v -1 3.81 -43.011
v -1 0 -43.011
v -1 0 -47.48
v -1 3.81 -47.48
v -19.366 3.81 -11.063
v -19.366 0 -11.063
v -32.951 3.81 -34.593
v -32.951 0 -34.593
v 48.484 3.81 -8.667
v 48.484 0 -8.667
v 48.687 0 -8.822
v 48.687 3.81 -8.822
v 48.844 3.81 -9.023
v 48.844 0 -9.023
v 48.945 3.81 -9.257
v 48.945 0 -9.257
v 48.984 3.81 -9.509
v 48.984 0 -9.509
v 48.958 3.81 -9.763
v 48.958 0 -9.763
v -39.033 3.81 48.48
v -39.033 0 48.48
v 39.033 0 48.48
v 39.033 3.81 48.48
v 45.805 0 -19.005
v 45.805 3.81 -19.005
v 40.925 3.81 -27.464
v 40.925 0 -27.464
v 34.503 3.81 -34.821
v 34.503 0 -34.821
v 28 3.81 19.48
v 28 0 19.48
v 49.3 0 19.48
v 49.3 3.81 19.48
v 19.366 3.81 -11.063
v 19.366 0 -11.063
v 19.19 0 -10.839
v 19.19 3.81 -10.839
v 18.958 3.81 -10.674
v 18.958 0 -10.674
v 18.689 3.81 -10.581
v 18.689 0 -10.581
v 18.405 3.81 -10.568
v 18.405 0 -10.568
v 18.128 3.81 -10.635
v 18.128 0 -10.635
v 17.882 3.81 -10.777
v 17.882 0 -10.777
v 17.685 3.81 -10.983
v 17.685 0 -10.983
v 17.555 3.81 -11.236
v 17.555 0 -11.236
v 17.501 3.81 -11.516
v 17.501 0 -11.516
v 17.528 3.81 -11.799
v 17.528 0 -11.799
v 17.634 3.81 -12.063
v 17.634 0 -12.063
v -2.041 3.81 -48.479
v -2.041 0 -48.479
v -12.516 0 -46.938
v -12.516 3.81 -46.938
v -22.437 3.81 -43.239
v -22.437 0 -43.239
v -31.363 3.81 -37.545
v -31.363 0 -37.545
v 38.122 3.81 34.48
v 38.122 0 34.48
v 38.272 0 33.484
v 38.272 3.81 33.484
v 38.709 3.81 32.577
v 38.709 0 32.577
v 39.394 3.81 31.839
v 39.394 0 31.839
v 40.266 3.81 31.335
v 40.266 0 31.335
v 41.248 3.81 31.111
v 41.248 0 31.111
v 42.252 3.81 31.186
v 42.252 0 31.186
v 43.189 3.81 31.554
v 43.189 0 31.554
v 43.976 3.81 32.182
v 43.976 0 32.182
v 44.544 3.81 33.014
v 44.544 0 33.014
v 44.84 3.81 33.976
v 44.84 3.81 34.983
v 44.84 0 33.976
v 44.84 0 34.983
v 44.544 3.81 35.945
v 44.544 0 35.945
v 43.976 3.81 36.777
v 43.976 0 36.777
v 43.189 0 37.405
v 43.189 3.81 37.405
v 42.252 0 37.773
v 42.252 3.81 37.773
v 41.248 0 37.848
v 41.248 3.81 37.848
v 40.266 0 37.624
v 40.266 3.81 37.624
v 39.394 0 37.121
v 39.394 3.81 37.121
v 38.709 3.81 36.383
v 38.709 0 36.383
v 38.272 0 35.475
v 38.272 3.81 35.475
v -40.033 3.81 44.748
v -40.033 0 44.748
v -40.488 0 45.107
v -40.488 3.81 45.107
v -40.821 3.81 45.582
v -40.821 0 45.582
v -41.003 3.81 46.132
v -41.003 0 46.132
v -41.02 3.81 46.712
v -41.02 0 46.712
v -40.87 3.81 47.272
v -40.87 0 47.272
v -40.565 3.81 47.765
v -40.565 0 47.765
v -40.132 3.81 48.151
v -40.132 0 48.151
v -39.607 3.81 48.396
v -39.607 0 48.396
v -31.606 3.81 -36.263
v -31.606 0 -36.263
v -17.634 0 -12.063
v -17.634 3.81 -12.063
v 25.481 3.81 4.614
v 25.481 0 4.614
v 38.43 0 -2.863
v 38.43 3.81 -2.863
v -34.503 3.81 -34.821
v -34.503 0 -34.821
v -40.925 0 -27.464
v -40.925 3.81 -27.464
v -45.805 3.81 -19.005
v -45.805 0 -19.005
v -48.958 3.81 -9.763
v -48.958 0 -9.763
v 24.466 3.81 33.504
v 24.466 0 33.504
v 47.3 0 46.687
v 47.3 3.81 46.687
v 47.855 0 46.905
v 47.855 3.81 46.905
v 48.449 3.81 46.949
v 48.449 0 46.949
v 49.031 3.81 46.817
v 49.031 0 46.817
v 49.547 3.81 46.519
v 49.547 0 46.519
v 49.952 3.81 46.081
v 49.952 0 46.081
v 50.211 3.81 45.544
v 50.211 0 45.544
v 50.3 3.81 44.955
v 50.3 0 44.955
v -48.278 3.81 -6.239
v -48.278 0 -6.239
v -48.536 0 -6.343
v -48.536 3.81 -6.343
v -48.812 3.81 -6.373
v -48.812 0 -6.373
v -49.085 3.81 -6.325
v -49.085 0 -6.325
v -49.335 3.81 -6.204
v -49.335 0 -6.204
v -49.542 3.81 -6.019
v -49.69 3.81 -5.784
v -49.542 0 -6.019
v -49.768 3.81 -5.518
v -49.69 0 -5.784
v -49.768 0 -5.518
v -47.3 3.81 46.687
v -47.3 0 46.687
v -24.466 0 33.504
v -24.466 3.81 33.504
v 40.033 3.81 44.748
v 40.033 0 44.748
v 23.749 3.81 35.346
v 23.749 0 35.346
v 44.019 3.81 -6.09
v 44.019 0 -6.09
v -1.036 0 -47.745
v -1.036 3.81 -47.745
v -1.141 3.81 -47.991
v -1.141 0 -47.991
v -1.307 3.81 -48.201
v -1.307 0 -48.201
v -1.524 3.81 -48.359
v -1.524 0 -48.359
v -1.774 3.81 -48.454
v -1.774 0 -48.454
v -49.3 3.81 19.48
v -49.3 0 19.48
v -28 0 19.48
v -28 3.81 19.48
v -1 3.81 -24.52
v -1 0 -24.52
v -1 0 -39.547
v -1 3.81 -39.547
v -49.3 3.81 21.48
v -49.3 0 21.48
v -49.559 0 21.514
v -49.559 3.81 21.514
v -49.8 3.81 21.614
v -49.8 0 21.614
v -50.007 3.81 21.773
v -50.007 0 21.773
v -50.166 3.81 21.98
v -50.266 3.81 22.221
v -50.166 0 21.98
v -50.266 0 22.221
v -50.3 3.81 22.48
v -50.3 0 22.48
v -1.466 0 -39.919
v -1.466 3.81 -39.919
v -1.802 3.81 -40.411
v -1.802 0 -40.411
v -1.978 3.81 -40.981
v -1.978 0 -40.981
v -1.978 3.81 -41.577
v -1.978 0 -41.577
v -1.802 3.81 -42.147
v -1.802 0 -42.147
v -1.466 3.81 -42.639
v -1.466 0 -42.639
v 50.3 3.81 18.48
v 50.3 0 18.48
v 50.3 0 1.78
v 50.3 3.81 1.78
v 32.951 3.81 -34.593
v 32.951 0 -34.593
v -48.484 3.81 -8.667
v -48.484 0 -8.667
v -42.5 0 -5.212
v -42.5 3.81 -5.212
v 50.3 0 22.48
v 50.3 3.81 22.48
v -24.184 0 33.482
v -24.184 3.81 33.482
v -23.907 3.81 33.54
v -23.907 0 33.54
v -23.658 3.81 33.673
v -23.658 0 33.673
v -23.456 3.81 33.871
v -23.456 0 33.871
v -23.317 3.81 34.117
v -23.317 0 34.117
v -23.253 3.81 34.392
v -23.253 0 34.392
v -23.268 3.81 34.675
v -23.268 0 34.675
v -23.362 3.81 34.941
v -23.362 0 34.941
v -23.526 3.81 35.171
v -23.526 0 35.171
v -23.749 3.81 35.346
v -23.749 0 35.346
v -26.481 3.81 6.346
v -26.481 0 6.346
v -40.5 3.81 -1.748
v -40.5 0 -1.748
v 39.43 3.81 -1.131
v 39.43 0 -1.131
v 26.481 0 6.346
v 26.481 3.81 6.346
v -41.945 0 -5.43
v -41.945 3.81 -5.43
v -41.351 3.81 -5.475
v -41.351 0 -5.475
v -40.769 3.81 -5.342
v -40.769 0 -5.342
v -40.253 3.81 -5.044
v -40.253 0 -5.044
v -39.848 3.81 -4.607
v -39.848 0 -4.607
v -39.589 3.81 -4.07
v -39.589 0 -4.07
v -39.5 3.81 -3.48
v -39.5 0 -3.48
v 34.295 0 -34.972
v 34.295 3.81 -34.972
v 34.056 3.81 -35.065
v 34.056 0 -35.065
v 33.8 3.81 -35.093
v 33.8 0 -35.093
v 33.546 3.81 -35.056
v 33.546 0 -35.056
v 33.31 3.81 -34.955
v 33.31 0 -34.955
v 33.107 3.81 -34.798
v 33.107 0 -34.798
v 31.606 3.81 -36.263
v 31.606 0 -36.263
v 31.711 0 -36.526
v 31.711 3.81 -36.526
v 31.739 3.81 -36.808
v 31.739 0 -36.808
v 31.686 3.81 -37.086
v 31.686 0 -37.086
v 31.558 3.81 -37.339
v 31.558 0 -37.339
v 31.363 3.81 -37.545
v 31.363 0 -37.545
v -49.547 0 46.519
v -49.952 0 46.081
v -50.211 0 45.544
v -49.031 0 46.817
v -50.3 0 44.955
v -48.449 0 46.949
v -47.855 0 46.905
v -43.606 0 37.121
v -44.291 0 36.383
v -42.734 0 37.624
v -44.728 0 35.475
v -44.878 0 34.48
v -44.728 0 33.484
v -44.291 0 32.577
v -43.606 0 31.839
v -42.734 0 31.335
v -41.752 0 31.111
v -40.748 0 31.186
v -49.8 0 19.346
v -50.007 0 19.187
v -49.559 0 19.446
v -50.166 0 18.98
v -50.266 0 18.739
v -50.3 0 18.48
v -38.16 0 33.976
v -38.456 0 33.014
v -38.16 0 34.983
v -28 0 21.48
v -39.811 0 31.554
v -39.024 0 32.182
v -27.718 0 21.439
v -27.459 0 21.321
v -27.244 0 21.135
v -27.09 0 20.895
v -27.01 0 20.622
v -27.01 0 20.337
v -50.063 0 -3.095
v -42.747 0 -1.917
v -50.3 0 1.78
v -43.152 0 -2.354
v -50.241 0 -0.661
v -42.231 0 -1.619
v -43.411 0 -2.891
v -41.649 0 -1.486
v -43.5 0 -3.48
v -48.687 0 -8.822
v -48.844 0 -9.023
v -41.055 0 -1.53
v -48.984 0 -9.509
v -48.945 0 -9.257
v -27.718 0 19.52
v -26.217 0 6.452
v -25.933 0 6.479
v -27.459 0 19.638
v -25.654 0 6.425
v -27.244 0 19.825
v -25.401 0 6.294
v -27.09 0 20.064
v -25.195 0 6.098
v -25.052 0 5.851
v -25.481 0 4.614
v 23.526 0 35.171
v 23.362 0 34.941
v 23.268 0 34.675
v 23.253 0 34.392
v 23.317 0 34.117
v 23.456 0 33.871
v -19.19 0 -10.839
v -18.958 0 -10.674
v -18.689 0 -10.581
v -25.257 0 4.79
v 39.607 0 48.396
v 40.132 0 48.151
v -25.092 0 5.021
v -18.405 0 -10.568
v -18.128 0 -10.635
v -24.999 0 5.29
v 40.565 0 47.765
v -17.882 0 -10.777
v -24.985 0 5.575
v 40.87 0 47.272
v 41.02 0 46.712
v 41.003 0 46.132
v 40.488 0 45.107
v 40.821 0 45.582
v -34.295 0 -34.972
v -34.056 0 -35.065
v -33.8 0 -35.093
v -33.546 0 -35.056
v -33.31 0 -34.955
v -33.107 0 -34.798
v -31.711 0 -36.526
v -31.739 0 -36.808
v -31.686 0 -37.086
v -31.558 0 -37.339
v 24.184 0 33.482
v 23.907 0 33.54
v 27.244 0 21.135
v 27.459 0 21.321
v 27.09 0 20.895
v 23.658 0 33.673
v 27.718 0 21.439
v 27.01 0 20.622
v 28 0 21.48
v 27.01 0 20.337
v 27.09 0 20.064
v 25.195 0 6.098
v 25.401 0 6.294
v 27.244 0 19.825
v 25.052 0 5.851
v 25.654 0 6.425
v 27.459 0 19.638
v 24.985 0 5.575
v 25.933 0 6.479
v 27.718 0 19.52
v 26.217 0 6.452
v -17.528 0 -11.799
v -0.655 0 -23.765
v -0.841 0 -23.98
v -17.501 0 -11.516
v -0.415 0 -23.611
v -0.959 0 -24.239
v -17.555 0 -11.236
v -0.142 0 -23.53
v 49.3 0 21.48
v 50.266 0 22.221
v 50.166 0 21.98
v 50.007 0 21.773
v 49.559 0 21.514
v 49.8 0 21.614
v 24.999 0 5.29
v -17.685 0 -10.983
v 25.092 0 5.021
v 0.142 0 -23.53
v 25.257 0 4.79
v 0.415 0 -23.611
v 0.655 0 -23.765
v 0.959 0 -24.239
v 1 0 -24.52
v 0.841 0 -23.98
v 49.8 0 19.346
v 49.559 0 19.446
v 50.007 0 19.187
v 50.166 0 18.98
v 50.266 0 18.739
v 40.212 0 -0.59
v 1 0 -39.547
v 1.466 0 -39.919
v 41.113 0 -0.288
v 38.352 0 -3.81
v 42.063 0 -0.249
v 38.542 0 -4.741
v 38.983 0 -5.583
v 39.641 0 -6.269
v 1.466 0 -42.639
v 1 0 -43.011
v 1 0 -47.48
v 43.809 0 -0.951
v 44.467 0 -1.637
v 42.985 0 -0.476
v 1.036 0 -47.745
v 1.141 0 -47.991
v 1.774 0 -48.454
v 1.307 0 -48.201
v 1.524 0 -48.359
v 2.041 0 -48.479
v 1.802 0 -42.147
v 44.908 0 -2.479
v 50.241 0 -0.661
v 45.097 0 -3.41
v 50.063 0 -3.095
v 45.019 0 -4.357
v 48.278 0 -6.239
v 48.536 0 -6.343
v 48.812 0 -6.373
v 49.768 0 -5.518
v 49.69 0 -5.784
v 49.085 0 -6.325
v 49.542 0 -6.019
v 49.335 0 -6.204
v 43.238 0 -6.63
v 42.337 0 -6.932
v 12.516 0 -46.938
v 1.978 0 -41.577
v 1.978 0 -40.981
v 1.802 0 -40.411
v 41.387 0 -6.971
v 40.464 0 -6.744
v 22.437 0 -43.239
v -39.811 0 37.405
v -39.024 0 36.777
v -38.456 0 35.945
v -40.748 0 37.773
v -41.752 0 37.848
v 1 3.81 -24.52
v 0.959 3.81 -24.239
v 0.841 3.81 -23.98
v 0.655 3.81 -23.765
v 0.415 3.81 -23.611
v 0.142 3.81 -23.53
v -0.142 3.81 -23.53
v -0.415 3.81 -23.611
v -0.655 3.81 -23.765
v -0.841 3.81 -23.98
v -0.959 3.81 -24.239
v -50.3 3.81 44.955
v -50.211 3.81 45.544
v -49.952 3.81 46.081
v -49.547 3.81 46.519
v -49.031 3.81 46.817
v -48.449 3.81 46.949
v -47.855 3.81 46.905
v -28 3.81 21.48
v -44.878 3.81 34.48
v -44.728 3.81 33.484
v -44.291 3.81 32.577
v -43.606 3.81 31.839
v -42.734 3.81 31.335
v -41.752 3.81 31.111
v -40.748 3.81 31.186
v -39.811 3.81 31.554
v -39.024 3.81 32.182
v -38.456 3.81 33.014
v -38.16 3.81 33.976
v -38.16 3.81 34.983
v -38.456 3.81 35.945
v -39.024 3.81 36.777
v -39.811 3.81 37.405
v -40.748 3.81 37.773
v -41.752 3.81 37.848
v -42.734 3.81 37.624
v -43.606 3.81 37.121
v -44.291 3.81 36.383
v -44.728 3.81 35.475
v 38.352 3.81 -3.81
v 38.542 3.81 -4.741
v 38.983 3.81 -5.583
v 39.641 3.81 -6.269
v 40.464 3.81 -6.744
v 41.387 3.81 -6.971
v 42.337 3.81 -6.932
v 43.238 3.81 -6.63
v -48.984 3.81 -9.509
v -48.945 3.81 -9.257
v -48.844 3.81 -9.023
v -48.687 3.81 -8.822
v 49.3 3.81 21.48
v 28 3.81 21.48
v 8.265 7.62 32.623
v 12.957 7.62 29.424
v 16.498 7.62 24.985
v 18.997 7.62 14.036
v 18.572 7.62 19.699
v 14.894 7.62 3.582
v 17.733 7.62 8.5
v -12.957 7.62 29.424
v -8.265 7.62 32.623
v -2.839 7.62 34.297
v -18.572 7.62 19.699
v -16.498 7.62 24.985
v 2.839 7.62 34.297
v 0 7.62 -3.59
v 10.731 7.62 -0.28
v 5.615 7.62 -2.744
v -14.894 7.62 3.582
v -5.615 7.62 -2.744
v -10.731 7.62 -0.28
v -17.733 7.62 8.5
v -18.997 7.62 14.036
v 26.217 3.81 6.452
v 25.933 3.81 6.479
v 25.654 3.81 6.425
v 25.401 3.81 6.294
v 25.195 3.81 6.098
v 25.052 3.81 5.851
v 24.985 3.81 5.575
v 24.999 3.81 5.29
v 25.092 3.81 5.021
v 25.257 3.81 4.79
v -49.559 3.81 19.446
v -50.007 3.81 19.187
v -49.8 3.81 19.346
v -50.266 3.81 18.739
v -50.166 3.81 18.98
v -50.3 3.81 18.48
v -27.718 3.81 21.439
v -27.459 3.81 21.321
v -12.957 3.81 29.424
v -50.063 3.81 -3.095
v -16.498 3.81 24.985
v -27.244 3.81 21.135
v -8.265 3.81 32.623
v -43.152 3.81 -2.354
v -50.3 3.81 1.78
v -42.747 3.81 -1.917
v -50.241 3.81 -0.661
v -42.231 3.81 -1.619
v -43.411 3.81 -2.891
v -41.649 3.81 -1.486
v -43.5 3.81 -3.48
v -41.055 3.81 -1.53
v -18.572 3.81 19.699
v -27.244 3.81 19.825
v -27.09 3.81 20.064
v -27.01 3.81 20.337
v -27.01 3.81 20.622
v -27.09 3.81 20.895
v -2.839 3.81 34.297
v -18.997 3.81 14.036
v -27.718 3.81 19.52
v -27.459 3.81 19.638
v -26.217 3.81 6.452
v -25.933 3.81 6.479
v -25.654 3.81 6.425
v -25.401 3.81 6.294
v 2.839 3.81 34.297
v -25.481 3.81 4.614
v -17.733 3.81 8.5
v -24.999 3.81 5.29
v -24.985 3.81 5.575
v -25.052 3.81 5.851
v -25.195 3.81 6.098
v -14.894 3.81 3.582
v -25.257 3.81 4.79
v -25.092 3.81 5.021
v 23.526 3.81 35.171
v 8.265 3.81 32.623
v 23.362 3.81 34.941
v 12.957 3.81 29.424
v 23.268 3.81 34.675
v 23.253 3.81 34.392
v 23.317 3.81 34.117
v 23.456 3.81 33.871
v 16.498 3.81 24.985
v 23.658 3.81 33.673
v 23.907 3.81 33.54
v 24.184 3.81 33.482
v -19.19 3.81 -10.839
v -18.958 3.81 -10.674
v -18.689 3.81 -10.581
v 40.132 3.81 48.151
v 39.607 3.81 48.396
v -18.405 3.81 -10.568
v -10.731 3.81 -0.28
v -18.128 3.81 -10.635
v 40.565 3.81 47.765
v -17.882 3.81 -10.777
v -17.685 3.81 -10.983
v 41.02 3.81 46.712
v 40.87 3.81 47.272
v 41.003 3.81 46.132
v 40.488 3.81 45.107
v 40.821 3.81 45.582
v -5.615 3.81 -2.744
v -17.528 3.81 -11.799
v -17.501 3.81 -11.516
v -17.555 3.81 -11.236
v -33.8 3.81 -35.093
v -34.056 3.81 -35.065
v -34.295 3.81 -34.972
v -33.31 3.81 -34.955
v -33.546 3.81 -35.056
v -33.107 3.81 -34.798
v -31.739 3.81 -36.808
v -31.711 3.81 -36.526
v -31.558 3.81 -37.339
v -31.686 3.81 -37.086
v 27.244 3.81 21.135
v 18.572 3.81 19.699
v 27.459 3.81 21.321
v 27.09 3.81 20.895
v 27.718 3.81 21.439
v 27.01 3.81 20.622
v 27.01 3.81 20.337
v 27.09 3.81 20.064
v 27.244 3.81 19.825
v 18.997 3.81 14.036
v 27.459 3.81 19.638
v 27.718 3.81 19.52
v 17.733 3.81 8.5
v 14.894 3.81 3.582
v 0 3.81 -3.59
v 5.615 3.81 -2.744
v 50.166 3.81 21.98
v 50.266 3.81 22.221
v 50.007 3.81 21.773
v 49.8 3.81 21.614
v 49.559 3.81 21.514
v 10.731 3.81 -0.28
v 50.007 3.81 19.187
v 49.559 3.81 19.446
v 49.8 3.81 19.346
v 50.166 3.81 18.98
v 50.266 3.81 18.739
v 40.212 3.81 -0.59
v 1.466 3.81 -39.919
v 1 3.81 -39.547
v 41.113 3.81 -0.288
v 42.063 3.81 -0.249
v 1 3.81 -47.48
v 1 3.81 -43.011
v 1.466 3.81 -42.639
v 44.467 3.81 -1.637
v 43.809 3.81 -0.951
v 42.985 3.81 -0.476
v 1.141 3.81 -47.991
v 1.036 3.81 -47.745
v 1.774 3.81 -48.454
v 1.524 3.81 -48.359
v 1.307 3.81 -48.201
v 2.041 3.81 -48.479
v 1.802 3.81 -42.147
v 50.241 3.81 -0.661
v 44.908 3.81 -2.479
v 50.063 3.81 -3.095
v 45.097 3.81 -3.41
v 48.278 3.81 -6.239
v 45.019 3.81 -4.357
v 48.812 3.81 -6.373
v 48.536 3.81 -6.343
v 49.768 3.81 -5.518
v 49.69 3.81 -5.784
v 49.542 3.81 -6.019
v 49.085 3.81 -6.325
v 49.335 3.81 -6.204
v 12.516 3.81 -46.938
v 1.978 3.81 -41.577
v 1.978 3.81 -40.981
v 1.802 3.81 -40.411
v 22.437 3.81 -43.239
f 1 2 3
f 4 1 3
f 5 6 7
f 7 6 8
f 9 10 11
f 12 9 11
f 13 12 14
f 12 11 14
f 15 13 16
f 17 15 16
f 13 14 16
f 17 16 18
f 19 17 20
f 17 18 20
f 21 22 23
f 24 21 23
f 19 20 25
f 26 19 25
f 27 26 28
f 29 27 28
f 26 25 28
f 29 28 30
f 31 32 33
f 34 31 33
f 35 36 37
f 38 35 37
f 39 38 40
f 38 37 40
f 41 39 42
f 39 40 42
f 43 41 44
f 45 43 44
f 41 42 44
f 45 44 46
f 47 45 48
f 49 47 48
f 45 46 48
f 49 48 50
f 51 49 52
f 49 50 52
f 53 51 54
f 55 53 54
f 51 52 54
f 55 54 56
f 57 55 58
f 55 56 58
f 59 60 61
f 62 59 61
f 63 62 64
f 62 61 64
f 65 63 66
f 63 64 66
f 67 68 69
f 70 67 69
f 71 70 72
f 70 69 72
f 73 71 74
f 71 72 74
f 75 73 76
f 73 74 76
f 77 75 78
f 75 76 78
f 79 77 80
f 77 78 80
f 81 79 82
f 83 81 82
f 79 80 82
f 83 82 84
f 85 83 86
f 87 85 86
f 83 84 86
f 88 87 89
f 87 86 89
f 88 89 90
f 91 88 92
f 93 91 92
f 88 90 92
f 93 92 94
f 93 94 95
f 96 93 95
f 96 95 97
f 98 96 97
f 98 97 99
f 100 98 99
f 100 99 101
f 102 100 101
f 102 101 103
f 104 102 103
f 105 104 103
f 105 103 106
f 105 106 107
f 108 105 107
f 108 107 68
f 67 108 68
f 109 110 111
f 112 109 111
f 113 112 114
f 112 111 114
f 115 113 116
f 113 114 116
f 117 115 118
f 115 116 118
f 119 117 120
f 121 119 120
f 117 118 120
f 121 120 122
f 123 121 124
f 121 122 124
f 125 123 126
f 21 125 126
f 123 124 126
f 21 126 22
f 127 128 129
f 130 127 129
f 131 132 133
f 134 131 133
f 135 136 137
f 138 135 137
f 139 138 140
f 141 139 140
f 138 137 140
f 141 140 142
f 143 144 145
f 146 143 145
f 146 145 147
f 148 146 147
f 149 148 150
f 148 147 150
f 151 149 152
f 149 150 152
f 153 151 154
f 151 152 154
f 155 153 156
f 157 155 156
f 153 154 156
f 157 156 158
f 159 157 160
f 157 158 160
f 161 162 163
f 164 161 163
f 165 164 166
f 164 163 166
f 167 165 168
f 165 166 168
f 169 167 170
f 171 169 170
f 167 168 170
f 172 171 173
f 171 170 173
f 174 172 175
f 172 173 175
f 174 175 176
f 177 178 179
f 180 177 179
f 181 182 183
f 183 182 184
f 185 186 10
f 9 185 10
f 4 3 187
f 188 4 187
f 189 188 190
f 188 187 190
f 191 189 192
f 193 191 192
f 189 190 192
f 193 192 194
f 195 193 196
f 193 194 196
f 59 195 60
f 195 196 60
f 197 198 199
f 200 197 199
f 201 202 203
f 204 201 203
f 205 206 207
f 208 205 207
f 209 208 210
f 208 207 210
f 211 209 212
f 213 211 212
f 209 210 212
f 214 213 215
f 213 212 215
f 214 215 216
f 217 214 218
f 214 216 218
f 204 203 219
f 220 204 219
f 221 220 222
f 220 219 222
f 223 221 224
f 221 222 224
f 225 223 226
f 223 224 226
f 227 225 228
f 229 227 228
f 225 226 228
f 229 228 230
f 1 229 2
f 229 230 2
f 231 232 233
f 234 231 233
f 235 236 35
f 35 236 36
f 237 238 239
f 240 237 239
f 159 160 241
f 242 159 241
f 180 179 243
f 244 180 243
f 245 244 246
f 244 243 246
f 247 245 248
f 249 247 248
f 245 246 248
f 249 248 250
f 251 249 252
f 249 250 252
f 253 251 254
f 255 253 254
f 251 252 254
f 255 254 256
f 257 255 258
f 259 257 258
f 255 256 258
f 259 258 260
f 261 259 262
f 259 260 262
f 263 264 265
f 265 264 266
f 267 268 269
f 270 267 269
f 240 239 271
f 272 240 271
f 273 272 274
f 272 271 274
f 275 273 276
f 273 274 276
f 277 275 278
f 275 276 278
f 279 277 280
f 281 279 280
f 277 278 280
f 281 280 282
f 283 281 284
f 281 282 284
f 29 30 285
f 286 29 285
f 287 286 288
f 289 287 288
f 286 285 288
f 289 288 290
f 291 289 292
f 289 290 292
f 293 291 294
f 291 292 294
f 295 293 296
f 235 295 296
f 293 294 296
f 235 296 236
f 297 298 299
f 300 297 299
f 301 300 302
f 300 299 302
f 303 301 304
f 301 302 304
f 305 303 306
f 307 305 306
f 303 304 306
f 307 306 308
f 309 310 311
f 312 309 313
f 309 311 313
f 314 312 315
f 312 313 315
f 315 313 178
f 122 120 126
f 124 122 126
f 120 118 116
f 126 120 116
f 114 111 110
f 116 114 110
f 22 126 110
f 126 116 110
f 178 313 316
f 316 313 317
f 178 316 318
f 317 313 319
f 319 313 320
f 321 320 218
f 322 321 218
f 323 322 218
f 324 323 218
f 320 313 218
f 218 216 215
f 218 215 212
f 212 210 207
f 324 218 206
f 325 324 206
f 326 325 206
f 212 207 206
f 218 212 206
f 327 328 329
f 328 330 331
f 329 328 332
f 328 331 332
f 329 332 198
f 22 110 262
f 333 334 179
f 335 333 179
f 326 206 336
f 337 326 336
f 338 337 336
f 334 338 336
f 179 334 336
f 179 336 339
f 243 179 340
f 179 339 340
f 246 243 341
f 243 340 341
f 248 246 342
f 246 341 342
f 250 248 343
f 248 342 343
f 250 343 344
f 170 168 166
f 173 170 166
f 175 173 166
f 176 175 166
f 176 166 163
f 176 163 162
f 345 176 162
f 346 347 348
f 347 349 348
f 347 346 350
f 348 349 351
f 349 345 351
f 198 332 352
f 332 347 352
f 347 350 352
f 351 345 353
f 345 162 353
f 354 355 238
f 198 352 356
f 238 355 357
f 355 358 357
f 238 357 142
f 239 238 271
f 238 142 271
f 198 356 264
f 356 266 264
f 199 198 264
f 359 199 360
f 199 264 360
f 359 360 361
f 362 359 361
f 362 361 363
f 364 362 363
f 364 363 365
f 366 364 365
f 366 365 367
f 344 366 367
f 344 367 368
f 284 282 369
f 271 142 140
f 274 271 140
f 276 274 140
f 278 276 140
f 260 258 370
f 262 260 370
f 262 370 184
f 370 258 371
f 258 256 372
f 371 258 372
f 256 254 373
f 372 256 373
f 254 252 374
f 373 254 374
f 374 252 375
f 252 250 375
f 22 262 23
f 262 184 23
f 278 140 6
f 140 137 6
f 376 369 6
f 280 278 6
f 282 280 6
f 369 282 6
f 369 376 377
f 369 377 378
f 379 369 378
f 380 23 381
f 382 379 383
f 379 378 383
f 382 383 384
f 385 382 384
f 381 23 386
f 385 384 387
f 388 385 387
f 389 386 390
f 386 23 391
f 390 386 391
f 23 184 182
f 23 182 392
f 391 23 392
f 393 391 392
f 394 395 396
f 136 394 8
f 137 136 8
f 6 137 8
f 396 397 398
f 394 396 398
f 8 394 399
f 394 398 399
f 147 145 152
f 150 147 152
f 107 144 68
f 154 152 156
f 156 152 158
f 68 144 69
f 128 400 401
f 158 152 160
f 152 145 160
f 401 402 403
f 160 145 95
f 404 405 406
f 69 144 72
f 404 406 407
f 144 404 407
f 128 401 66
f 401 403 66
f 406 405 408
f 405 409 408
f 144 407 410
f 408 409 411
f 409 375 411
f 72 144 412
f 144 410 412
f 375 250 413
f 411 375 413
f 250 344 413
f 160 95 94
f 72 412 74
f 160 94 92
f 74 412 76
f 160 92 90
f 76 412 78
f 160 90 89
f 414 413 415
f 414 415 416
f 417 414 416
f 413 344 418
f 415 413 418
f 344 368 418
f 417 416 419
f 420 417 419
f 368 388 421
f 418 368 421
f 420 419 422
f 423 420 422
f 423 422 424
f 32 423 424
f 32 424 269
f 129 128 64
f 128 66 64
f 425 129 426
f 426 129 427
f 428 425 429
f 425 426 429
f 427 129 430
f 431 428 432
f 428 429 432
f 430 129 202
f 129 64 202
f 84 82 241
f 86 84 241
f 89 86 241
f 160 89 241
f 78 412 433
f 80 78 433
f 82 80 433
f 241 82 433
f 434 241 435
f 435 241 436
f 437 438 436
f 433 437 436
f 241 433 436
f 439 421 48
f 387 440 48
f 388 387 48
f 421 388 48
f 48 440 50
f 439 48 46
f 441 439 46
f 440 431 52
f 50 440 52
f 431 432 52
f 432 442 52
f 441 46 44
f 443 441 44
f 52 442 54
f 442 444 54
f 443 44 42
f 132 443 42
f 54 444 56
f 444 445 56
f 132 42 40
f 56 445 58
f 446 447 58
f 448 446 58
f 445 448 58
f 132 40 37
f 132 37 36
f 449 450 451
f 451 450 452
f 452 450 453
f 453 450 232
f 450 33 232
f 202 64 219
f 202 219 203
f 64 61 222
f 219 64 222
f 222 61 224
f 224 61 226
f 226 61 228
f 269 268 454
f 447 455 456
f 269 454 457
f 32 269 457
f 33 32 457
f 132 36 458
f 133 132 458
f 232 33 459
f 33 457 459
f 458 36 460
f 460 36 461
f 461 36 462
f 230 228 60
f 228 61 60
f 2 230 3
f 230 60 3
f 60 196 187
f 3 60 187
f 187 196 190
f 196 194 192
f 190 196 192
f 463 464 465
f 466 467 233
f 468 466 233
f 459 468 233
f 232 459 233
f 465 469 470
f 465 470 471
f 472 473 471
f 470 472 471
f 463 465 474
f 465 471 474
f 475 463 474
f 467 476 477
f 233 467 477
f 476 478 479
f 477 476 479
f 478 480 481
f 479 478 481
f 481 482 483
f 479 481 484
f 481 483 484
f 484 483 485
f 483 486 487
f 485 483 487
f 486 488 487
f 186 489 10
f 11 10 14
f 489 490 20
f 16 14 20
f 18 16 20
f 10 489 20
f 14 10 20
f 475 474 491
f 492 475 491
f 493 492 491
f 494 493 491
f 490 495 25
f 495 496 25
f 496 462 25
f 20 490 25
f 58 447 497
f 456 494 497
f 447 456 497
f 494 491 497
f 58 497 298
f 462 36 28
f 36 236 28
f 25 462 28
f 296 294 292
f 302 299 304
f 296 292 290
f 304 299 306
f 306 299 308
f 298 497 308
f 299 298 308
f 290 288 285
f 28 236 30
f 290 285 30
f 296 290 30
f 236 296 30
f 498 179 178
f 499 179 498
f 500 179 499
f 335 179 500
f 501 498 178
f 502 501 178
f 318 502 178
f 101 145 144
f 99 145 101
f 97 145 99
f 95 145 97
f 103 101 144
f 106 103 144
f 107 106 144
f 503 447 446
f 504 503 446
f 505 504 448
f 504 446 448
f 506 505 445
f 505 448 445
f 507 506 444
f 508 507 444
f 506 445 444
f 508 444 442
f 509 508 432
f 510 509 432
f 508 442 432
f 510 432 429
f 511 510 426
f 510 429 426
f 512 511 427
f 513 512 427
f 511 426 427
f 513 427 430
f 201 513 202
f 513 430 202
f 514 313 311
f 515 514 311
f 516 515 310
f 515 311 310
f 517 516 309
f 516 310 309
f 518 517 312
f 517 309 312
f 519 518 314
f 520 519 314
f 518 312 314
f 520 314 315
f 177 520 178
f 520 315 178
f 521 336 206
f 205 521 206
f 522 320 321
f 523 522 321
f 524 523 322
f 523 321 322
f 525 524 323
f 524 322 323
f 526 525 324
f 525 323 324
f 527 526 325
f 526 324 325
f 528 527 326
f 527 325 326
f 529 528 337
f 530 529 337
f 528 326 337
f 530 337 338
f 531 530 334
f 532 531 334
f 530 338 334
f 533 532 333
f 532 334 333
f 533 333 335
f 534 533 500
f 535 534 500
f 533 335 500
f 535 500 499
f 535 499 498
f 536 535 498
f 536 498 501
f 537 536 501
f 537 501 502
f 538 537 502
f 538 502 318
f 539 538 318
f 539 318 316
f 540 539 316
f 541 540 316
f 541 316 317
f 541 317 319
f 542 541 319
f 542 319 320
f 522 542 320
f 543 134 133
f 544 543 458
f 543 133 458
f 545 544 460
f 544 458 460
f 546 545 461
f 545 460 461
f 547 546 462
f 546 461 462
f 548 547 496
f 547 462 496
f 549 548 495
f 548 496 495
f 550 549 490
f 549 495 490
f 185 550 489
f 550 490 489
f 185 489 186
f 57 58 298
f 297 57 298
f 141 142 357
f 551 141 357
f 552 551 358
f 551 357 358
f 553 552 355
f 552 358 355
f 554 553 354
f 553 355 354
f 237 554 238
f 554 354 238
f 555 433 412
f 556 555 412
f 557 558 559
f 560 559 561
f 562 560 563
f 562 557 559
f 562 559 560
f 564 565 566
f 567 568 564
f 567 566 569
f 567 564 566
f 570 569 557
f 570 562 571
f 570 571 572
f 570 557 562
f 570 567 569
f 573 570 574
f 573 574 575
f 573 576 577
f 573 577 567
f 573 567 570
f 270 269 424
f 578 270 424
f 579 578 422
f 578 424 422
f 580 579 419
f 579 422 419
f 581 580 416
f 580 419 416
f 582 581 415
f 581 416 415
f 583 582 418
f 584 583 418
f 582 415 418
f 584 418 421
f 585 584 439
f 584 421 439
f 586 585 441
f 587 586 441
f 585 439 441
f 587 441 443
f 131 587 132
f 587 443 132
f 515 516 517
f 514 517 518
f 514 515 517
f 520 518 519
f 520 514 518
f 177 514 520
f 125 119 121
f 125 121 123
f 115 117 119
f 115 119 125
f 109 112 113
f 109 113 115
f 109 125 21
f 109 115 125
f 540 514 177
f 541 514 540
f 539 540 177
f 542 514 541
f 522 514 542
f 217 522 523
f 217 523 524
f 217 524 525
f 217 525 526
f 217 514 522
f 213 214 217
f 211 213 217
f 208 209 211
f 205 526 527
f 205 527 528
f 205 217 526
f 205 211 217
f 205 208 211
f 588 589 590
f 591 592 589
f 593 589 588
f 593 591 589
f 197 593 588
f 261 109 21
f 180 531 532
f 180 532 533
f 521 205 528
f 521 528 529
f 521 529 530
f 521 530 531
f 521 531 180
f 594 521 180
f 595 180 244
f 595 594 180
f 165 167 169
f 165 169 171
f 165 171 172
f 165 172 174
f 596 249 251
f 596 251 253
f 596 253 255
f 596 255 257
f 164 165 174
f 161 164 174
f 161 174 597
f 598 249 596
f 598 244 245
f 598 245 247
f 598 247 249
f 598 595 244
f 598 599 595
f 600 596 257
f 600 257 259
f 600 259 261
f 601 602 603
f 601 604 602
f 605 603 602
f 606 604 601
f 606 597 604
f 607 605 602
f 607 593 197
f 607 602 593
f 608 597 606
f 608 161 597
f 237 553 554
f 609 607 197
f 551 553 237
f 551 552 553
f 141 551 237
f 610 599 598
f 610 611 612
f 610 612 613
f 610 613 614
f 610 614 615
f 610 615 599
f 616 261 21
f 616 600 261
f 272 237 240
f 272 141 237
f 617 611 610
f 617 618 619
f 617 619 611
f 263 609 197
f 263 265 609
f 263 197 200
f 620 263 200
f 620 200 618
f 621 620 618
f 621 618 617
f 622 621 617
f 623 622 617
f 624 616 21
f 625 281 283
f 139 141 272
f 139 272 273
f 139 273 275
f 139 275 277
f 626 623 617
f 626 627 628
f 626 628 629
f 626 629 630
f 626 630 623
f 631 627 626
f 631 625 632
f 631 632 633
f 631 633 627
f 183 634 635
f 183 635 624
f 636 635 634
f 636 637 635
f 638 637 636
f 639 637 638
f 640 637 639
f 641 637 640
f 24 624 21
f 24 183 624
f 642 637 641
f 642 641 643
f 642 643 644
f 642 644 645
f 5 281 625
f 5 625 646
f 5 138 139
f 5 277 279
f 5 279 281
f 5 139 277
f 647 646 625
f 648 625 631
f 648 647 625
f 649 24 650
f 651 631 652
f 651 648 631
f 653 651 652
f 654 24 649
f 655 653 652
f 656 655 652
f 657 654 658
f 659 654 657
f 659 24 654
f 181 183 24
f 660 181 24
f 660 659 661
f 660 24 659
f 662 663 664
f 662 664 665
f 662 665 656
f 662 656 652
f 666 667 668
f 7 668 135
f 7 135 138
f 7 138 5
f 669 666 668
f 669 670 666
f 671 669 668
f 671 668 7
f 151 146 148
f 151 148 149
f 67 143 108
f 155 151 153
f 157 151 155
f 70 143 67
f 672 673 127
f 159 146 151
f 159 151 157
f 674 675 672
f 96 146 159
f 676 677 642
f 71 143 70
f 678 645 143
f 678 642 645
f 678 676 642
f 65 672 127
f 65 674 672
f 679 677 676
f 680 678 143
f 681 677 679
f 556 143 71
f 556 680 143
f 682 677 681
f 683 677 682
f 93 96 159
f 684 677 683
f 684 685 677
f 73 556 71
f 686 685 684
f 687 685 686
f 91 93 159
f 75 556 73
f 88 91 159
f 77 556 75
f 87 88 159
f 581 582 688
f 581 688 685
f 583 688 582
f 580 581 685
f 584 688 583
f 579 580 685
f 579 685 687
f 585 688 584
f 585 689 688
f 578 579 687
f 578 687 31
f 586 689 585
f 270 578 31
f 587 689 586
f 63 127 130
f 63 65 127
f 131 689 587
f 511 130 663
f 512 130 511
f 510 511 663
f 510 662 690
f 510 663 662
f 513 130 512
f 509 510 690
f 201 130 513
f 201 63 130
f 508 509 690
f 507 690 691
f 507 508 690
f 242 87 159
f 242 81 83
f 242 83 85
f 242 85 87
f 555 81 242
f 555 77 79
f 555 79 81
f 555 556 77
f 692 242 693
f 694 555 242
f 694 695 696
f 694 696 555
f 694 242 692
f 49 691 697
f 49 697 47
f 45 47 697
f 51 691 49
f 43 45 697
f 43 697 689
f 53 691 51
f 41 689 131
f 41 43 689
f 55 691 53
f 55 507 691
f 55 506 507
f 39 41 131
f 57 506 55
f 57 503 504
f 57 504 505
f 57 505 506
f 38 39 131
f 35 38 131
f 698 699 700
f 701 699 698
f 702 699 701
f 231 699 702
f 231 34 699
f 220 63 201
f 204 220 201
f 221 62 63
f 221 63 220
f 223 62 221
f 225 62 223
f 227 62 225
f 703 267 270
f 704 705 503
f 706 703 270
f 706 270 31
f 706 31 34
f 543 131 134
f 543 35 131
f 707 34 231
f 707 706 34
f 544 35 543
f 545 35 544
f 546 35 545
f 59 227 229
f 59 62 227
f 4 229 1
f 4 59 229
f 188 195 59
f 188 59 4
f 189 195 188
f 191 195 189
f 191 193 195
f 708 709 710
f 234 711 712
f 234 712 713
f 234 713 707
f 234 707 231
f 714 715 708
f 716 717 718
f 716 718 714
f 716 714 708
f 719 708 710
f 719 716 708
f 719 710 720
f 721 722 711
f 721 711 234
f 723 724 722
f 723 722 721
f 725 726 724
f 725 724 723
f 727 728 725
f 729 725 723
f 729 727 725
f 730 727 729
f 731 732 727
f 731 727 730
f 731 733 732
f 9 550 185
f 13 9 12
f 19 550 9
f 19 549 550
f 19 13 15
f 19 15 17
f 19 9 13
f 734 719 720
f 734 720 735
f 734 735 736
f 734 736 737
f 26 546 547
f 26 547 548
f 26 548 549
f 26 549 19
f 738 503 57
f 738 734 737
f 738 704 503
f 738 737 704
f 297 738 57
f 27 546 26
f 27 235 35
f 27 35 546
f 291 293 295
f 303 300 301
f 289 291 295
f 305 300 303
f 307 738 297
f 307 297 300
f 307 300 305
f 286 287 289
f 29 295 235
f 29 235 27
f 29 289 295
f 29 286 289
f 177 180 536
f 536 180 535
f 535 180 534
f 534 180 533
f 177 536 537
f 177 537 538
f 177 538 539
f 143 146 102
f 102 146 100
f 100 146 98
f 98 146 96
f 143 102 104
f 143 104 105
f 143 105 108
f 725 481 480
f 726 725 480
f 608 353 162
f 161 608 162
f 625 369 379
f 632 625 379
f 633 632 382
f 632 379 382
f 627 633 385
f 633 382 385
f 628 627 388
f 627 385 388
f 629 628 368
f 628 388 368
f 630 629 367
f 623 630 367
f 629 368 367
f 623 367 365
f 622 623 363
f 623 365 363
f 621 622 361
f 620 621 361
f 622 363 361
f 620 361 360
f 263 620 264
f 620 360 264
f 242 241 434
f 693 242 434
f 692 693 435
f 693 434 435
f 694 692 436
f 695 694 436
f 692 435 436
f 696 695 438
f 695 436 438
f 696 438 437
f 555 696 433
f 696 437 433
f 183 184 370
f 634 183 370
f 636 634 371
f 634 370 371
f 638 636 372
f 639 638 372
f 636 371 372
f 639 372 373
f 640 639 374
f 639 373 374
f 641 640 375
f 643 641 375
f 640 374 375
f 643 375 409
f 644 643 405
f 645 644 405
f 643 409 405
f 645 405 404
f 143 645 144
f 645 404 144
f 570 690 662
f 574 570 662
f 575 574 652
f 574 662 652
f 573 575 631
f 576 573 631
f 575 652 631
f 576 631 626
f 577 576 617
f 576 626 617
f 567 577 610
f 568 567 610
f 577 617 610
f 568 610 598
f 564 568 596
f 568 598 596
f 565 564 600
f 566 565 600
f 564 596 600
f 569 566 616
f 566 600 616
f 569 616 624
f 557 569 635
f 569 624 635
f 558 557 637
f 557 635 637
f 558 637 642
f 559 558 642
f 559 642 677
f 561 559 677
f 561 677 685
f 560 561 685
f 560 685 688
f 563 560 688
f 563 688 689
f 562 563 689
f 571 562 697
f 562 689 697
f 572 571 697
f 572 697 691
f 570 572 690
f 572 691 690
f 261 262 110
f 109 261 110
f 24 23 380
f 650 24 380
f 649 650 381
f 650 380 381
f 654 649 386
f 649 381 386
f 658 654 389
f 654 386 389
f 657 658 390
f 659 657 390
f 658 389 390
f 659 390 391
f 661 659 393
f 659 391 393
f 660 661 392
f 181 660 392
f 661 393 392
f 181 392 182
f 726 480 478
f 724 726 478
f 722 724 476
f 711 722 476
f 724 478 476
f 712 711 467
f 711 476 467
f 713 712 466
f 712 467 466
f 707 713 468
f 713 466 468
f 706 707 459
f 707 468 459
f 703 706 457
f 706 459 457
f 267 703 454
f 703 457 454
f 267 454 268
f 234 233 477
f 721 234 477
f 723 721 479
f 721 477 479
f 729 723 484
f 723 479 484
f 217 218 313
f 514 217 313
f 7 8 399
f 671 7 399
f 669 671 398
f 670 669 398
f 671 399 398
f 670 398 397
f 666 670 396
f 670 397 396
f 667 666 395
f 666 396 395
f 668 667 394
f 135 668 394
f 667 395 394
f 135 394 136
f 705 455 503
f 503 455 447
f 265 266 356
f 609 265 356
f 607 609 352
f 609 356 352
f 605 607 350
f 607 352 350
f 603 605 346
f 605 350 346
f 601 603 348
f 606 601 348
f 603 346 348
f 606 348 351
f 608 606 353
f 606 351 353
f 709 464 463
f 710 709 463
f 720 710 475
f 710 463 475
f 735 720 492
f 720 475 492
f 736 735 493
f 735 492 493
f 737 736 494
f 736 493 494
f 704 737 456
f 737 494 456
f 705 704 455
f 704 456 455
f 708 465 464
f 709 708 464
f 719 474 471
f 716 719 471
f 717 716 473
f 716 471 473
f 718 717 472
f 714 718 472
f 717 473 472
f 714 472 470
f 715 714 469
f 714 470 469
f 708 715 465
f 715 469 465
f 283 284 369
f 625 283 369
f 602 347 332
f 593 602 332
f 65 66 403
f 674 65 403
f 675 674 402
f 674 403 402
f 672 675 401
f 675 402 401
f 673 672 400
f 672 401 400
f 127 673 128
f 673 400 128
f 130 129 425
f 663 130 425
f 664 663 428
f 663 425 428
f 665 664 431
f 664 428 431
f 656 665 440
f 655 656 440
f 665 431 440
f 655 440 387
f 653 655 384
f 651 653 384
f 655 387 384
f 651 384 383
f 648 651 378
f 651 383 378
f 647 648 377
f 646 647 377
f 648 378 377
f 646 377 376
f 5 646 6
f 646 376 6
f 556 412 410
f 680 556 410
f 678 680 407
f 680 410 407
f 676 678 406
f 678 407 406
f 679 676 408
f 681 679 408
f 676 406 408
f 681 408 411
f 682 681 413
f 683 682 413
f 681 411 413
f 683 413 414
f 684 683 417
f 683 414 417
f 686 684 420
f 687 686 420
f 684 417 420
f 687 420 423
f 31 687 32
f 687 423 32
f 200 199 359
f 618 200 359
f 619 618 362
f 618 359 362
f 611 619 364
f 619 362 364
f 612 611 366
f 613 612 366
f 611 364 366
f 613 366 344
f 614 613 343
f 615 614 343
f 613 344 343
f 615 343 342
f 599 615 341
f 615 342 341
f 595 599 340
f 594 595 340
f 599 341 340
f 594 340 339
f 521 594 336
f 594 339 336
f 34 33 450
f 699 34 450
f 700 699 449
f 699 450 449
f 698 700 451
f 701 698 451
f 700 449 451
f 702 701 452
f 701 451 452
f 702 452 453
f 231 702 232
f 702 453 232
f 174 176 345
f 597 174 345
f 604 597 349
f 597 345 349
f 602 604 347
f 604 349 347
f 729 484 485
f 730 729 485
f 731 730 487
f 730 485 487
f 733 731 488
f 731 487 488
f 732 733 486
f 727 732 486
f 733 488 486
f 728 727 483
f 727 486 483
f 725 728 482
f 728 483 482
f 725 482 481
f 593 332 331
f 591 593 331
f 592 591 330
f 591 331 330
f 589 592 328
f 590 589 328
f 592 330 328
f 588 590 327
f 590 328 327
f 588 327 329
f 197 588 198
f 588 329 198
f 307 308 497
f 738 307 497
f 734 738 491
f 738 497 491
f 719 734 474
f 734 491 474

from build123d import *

# Parameters (mm, degrees)
SKETCH2_R                   = 2
BOSS_EXTRUDE1_DEPTH         = 3.81
SKETCH3_R                   = 19.05
BOSS_EXTRUDE2_DEPTH         = 3.81
F_1_4_CLEARANCE_HOLE1_D     = 6.7564
F_1_4_CLEARANCE_HOLE1_DEPTH = 3.81


with BuildPart() as part:
    # Sketch2 → Boss-Extrude1 (new body)
    with BuildSketch(Plane(origin=(0, 0, 0), x_dir=(1, 0, 0), z_dir=(0, 1, 0))):
        with BuildLine():
            Line((40.724728738, 1.878024889), (26.480762114, -6.345733076))
            ThreePointArc((26.480762114, -6.345733076), (25.11473671, -5.979707672), (25.480762114, -4.613682268))
            Line((25.480762114, -4.613682268), (39.724728738, 3.610075697))
            ThreePointArc((39.724728738, 3.610075697), (40.724728738, 5.342126504), (42.724728738, 5.342126504))
            Line((42.724728738, 5.342126504), (48.484388044, 8.667467356))
            ThreePointArc((48.484388044, 8.667467356), (48.902372172, 9.136875637), (48.957702204, 9.762969441))
            ThreePointArc((48.957702204, 9.762969441), (43.570719337, 23.353585317), (34.503184828, 34.821115225))
            ThreePointArc((34.503184828, 34.821115225), (33.67210529, 35.082877041), (32.951211415, 34.593464671))
            Line((32.951211415, 34.593464671), (19.366025404, 11.063232268))
            ThreePointArc((19.366025404, 11.063232268), (18, 10.697206864), (17.633974596, 12.063232268))
            Line((17.633974596, 12.063232268), (31.605824937, 36.263186935))
            ThreePointArc((31.605824937, 36.263186935), (31.722370232, 36.949076207), (31.363324879, 37.544990071))
            ThreePointArc((31.363324879, 37.544990071), (17.573916059, 45.350404511), (2.040567951, 48.478884454))
            ThreePointArc((2.040567951, 48.478884454), (1.307384649, 48.201014802), (1, 47.479707672))
            Line((1, 47.479707672), (1, 43.010935261))
            ThreePointArc((1, 43.010935261), (2, 41.278884454), (1, 39.546833646))
            Line((1, 39.546833646), (1, 24.520292328))
            ThreePointArc((1, 24.520292328), (0, 23.520292328), (-1, 24.520292328))
            Line((-1, 24.520292328), (-1, 39.546833646))
            ThreePointArc((-1, 39.546833646), (-2, 41.278884454), (-1, 43.010935261))
            Line((-1, 43.010935261), (-1, 47.479707672))
            ThreePointArc((-1, 47.479707672), (-1.307384649, 48.201014802), (-2.040567951, 48.478884454))
            ThreePointArc((-2.040567951, 48.478884454), (-17.573916059, 45.350404511), (-31.363324879, 37.544990071))
            ThreePointArc((-31.363324879, 37.544990071), (-31.722370232, 36.949076207), (-31.605824937, 36.263186935))
            Line((-31.605824937, 36.263186935), (-17.633974596, 12.063232268))
            ThreePointArc((-17.633974596, 12.063232268), (-18, 10.697206864), (-19.366025404, 11.063232268))
            Line((-19.366025404, 11.063232268), (-32.951211415, 34.593464671))
            ThreePointArc((-32.951211415, 34.593464671), (-33.67210529, 35.082877041), (-34.503184828, 34.821115225))
            ThreePointArc((-34.503184828, 34.821115225), (-43.570719337, 23.353585317), (-48.957702204, 9.762969441))
            ThreePointArc((-48.957702204, 9.762969441), (-48.902372172, 9.136875637), (-48.484388044, 8.667467356))
            Line((-48.484388044, 8.667467356), (-42.5, 5.212379307))
            ThreePointArc((-42.5, 5.212379307), (-40.5, 5.212379307), (-39.5, 3.4803285))
            Line((-39.5, 3.4803285), (-25.480762114, -4.613682268))
            ThreePointArc((-25.480762114, -4.613682268), (-25.11473671, -5.979707672), (-26.480762114, -6.345733076))
            Line((-26.480762114, -6.345733076), (-40.5, 1.748277692))
            ThreePointArc((-40.5, 1.748277692), (-42.5, 1.748277692), (-43.5, 3.4803285))
            Line((-43.5, 3.4803285), (-48.278351245, 6.239110877))
            ThreePointArc((-48.278351245, 6.239110877), (-49.214035452, 6.273185063), (-49.767770135, 5.518172556))
            ThreePointArc((-49.767770135, 5.518172556), (-50.16676608, 1.878923371), (-50.3, -1.779707672))
            Line((-50.3, -1.779707672), (-50.3, -18.479707672))
            ThreePointArc((-50.3, -18.479707672), (-50.007106781, -19.186814453), (-49.3, -19.479707672))
            Line((-49.3, -19.479707672), (-28, -19.479707672))
            ThreePointArc((-28, -19.479707672), (-27, -20.479707672), (-28, -21.479707672))
            Line((-28, -21.479707672), (-49.3, -21.479707672))
            ThreePointArc((-49.3, -21.479707672), (-50.007106781, -21.772600891), (-50.3, -22.479707672))
            Line((-50.3, -22.479707672), (-50.3, -44.954844537))
            ThreePointArc((-50.3, -44.954844537), (-49.3, -46.686895345), (-47.3, -46.686895345))
            Line((-47.3, -46.686895345), (-24.465777351, -33.503550752))
            ThreePointArc((-24.465777351, -33.503550752), (-23.31681977, -34.116970624), (-23.748711306, -35.345733076))
            Line((-23.748711306, -35.345733076), (-40.033320997, -44.747656864))
            ThreePointArc((-40.033320997, -44.747656864), (-40.965172649, -46.997345762), (-39.033320997, -48.479707672))
            Line((-39.033320997, -48.479707672), (39.033320997, -48.479707672))
            ThreePointArc((39.033320997, -48.479707672), (40.965172649, -46.997345762), (40.033320997, -44.747656864))
            Line((40.033320997, -44.747656864), (23.748711306, -35.345733076))
            ThreePointArc((23.748711306, -35.345733076), (23.31681977, -34.116970624), (24.465777351, -33.503550752))
            Line((24.465777351, -33.503550752), (47.3, -46.686895345))
            ThreePointArc((47.3, -46.686895345), (49.3, -46.686895345), (50.3, -44.954844537))
            Line((50.3, -44.954844537), (50.3, -22.479707672))
            ThreePointArc((50.3, -22.479707672), (50.007106781, -21.772600891), (49.3, -21.479707672))
            Line((49.3, -21.479707672), (28, -21.479707672))
            ThreePointArc((28, -21.479707672), (27, -20.479707672), (28, -19.479707672))
            Line((28, -19.479707672), (49.3, -19.479707672))
            ThreePointArc((49.3, -19.479707672), (50.007106781, -19.186814453), (50.3, -18.479707672))
            Line((50.3, -18.479707672), (50.3, -1.779707672))
            ThreePointArc((50.3, -1.779707672), (50.16676608, 1.878923371), (49.767770135, 5.518172556))
            ThreePointArc((49.767770135, 5.518172556), (49.214035452, 6.273185063), (48.278351245, 6.239110877))
            Line((48.278351245, 6.239110877), (43.724728738, 3.610075697))
            ThreePointArc((43.724728738, 3.610075697), (42.724728738, 1.878024889), (40.724728738, 1.878024889))
        make_face()
        with Locations(Location((-41.5, -34.479707672, 0), (0, 0, 90))):
            Circle(SKETCH2_R, mode=Mode.SUBTRACT)
        with Locations(Location((41.5, -34.479707672, 0), (0, 0, 90))):
            Circle(SKETCH2_R, mode=Mode.SUBTRACT)
    extrude(amount=BOSS_EXTRUDE1_DEPTH)

    # Sketch3 → Boss-Extrude2 (add)
    with BuildSketch(Plane(origin=(0, 3.81, 0), x_dir=(1, 0, 0), z_dir=(0, 1, 0))):
        with Locations(Location((0, -15.459707672, 0), (0, 0, 90))):
            Circle(SKETCH3_R)
    extrude(amount=BOSS_EXTRUDE2_DEPTH)

    # 1/4 Clearance Hole1
    with Locations(Plane(origin=(0, 3.81, 0), x_dir=(1, 0, 0), z_dir=(0, 1, 0))):
        with Locations((41.5, -34.479707672), (41.724728738, 3.610075697), (-41.5, -34.479707672)):
            Hole(F_1_4_CLEARANCE_HOLE1_D / 2, depth=F_1_4_CLEARANCE_HOLE1_DEPTH)


solid = part.part
